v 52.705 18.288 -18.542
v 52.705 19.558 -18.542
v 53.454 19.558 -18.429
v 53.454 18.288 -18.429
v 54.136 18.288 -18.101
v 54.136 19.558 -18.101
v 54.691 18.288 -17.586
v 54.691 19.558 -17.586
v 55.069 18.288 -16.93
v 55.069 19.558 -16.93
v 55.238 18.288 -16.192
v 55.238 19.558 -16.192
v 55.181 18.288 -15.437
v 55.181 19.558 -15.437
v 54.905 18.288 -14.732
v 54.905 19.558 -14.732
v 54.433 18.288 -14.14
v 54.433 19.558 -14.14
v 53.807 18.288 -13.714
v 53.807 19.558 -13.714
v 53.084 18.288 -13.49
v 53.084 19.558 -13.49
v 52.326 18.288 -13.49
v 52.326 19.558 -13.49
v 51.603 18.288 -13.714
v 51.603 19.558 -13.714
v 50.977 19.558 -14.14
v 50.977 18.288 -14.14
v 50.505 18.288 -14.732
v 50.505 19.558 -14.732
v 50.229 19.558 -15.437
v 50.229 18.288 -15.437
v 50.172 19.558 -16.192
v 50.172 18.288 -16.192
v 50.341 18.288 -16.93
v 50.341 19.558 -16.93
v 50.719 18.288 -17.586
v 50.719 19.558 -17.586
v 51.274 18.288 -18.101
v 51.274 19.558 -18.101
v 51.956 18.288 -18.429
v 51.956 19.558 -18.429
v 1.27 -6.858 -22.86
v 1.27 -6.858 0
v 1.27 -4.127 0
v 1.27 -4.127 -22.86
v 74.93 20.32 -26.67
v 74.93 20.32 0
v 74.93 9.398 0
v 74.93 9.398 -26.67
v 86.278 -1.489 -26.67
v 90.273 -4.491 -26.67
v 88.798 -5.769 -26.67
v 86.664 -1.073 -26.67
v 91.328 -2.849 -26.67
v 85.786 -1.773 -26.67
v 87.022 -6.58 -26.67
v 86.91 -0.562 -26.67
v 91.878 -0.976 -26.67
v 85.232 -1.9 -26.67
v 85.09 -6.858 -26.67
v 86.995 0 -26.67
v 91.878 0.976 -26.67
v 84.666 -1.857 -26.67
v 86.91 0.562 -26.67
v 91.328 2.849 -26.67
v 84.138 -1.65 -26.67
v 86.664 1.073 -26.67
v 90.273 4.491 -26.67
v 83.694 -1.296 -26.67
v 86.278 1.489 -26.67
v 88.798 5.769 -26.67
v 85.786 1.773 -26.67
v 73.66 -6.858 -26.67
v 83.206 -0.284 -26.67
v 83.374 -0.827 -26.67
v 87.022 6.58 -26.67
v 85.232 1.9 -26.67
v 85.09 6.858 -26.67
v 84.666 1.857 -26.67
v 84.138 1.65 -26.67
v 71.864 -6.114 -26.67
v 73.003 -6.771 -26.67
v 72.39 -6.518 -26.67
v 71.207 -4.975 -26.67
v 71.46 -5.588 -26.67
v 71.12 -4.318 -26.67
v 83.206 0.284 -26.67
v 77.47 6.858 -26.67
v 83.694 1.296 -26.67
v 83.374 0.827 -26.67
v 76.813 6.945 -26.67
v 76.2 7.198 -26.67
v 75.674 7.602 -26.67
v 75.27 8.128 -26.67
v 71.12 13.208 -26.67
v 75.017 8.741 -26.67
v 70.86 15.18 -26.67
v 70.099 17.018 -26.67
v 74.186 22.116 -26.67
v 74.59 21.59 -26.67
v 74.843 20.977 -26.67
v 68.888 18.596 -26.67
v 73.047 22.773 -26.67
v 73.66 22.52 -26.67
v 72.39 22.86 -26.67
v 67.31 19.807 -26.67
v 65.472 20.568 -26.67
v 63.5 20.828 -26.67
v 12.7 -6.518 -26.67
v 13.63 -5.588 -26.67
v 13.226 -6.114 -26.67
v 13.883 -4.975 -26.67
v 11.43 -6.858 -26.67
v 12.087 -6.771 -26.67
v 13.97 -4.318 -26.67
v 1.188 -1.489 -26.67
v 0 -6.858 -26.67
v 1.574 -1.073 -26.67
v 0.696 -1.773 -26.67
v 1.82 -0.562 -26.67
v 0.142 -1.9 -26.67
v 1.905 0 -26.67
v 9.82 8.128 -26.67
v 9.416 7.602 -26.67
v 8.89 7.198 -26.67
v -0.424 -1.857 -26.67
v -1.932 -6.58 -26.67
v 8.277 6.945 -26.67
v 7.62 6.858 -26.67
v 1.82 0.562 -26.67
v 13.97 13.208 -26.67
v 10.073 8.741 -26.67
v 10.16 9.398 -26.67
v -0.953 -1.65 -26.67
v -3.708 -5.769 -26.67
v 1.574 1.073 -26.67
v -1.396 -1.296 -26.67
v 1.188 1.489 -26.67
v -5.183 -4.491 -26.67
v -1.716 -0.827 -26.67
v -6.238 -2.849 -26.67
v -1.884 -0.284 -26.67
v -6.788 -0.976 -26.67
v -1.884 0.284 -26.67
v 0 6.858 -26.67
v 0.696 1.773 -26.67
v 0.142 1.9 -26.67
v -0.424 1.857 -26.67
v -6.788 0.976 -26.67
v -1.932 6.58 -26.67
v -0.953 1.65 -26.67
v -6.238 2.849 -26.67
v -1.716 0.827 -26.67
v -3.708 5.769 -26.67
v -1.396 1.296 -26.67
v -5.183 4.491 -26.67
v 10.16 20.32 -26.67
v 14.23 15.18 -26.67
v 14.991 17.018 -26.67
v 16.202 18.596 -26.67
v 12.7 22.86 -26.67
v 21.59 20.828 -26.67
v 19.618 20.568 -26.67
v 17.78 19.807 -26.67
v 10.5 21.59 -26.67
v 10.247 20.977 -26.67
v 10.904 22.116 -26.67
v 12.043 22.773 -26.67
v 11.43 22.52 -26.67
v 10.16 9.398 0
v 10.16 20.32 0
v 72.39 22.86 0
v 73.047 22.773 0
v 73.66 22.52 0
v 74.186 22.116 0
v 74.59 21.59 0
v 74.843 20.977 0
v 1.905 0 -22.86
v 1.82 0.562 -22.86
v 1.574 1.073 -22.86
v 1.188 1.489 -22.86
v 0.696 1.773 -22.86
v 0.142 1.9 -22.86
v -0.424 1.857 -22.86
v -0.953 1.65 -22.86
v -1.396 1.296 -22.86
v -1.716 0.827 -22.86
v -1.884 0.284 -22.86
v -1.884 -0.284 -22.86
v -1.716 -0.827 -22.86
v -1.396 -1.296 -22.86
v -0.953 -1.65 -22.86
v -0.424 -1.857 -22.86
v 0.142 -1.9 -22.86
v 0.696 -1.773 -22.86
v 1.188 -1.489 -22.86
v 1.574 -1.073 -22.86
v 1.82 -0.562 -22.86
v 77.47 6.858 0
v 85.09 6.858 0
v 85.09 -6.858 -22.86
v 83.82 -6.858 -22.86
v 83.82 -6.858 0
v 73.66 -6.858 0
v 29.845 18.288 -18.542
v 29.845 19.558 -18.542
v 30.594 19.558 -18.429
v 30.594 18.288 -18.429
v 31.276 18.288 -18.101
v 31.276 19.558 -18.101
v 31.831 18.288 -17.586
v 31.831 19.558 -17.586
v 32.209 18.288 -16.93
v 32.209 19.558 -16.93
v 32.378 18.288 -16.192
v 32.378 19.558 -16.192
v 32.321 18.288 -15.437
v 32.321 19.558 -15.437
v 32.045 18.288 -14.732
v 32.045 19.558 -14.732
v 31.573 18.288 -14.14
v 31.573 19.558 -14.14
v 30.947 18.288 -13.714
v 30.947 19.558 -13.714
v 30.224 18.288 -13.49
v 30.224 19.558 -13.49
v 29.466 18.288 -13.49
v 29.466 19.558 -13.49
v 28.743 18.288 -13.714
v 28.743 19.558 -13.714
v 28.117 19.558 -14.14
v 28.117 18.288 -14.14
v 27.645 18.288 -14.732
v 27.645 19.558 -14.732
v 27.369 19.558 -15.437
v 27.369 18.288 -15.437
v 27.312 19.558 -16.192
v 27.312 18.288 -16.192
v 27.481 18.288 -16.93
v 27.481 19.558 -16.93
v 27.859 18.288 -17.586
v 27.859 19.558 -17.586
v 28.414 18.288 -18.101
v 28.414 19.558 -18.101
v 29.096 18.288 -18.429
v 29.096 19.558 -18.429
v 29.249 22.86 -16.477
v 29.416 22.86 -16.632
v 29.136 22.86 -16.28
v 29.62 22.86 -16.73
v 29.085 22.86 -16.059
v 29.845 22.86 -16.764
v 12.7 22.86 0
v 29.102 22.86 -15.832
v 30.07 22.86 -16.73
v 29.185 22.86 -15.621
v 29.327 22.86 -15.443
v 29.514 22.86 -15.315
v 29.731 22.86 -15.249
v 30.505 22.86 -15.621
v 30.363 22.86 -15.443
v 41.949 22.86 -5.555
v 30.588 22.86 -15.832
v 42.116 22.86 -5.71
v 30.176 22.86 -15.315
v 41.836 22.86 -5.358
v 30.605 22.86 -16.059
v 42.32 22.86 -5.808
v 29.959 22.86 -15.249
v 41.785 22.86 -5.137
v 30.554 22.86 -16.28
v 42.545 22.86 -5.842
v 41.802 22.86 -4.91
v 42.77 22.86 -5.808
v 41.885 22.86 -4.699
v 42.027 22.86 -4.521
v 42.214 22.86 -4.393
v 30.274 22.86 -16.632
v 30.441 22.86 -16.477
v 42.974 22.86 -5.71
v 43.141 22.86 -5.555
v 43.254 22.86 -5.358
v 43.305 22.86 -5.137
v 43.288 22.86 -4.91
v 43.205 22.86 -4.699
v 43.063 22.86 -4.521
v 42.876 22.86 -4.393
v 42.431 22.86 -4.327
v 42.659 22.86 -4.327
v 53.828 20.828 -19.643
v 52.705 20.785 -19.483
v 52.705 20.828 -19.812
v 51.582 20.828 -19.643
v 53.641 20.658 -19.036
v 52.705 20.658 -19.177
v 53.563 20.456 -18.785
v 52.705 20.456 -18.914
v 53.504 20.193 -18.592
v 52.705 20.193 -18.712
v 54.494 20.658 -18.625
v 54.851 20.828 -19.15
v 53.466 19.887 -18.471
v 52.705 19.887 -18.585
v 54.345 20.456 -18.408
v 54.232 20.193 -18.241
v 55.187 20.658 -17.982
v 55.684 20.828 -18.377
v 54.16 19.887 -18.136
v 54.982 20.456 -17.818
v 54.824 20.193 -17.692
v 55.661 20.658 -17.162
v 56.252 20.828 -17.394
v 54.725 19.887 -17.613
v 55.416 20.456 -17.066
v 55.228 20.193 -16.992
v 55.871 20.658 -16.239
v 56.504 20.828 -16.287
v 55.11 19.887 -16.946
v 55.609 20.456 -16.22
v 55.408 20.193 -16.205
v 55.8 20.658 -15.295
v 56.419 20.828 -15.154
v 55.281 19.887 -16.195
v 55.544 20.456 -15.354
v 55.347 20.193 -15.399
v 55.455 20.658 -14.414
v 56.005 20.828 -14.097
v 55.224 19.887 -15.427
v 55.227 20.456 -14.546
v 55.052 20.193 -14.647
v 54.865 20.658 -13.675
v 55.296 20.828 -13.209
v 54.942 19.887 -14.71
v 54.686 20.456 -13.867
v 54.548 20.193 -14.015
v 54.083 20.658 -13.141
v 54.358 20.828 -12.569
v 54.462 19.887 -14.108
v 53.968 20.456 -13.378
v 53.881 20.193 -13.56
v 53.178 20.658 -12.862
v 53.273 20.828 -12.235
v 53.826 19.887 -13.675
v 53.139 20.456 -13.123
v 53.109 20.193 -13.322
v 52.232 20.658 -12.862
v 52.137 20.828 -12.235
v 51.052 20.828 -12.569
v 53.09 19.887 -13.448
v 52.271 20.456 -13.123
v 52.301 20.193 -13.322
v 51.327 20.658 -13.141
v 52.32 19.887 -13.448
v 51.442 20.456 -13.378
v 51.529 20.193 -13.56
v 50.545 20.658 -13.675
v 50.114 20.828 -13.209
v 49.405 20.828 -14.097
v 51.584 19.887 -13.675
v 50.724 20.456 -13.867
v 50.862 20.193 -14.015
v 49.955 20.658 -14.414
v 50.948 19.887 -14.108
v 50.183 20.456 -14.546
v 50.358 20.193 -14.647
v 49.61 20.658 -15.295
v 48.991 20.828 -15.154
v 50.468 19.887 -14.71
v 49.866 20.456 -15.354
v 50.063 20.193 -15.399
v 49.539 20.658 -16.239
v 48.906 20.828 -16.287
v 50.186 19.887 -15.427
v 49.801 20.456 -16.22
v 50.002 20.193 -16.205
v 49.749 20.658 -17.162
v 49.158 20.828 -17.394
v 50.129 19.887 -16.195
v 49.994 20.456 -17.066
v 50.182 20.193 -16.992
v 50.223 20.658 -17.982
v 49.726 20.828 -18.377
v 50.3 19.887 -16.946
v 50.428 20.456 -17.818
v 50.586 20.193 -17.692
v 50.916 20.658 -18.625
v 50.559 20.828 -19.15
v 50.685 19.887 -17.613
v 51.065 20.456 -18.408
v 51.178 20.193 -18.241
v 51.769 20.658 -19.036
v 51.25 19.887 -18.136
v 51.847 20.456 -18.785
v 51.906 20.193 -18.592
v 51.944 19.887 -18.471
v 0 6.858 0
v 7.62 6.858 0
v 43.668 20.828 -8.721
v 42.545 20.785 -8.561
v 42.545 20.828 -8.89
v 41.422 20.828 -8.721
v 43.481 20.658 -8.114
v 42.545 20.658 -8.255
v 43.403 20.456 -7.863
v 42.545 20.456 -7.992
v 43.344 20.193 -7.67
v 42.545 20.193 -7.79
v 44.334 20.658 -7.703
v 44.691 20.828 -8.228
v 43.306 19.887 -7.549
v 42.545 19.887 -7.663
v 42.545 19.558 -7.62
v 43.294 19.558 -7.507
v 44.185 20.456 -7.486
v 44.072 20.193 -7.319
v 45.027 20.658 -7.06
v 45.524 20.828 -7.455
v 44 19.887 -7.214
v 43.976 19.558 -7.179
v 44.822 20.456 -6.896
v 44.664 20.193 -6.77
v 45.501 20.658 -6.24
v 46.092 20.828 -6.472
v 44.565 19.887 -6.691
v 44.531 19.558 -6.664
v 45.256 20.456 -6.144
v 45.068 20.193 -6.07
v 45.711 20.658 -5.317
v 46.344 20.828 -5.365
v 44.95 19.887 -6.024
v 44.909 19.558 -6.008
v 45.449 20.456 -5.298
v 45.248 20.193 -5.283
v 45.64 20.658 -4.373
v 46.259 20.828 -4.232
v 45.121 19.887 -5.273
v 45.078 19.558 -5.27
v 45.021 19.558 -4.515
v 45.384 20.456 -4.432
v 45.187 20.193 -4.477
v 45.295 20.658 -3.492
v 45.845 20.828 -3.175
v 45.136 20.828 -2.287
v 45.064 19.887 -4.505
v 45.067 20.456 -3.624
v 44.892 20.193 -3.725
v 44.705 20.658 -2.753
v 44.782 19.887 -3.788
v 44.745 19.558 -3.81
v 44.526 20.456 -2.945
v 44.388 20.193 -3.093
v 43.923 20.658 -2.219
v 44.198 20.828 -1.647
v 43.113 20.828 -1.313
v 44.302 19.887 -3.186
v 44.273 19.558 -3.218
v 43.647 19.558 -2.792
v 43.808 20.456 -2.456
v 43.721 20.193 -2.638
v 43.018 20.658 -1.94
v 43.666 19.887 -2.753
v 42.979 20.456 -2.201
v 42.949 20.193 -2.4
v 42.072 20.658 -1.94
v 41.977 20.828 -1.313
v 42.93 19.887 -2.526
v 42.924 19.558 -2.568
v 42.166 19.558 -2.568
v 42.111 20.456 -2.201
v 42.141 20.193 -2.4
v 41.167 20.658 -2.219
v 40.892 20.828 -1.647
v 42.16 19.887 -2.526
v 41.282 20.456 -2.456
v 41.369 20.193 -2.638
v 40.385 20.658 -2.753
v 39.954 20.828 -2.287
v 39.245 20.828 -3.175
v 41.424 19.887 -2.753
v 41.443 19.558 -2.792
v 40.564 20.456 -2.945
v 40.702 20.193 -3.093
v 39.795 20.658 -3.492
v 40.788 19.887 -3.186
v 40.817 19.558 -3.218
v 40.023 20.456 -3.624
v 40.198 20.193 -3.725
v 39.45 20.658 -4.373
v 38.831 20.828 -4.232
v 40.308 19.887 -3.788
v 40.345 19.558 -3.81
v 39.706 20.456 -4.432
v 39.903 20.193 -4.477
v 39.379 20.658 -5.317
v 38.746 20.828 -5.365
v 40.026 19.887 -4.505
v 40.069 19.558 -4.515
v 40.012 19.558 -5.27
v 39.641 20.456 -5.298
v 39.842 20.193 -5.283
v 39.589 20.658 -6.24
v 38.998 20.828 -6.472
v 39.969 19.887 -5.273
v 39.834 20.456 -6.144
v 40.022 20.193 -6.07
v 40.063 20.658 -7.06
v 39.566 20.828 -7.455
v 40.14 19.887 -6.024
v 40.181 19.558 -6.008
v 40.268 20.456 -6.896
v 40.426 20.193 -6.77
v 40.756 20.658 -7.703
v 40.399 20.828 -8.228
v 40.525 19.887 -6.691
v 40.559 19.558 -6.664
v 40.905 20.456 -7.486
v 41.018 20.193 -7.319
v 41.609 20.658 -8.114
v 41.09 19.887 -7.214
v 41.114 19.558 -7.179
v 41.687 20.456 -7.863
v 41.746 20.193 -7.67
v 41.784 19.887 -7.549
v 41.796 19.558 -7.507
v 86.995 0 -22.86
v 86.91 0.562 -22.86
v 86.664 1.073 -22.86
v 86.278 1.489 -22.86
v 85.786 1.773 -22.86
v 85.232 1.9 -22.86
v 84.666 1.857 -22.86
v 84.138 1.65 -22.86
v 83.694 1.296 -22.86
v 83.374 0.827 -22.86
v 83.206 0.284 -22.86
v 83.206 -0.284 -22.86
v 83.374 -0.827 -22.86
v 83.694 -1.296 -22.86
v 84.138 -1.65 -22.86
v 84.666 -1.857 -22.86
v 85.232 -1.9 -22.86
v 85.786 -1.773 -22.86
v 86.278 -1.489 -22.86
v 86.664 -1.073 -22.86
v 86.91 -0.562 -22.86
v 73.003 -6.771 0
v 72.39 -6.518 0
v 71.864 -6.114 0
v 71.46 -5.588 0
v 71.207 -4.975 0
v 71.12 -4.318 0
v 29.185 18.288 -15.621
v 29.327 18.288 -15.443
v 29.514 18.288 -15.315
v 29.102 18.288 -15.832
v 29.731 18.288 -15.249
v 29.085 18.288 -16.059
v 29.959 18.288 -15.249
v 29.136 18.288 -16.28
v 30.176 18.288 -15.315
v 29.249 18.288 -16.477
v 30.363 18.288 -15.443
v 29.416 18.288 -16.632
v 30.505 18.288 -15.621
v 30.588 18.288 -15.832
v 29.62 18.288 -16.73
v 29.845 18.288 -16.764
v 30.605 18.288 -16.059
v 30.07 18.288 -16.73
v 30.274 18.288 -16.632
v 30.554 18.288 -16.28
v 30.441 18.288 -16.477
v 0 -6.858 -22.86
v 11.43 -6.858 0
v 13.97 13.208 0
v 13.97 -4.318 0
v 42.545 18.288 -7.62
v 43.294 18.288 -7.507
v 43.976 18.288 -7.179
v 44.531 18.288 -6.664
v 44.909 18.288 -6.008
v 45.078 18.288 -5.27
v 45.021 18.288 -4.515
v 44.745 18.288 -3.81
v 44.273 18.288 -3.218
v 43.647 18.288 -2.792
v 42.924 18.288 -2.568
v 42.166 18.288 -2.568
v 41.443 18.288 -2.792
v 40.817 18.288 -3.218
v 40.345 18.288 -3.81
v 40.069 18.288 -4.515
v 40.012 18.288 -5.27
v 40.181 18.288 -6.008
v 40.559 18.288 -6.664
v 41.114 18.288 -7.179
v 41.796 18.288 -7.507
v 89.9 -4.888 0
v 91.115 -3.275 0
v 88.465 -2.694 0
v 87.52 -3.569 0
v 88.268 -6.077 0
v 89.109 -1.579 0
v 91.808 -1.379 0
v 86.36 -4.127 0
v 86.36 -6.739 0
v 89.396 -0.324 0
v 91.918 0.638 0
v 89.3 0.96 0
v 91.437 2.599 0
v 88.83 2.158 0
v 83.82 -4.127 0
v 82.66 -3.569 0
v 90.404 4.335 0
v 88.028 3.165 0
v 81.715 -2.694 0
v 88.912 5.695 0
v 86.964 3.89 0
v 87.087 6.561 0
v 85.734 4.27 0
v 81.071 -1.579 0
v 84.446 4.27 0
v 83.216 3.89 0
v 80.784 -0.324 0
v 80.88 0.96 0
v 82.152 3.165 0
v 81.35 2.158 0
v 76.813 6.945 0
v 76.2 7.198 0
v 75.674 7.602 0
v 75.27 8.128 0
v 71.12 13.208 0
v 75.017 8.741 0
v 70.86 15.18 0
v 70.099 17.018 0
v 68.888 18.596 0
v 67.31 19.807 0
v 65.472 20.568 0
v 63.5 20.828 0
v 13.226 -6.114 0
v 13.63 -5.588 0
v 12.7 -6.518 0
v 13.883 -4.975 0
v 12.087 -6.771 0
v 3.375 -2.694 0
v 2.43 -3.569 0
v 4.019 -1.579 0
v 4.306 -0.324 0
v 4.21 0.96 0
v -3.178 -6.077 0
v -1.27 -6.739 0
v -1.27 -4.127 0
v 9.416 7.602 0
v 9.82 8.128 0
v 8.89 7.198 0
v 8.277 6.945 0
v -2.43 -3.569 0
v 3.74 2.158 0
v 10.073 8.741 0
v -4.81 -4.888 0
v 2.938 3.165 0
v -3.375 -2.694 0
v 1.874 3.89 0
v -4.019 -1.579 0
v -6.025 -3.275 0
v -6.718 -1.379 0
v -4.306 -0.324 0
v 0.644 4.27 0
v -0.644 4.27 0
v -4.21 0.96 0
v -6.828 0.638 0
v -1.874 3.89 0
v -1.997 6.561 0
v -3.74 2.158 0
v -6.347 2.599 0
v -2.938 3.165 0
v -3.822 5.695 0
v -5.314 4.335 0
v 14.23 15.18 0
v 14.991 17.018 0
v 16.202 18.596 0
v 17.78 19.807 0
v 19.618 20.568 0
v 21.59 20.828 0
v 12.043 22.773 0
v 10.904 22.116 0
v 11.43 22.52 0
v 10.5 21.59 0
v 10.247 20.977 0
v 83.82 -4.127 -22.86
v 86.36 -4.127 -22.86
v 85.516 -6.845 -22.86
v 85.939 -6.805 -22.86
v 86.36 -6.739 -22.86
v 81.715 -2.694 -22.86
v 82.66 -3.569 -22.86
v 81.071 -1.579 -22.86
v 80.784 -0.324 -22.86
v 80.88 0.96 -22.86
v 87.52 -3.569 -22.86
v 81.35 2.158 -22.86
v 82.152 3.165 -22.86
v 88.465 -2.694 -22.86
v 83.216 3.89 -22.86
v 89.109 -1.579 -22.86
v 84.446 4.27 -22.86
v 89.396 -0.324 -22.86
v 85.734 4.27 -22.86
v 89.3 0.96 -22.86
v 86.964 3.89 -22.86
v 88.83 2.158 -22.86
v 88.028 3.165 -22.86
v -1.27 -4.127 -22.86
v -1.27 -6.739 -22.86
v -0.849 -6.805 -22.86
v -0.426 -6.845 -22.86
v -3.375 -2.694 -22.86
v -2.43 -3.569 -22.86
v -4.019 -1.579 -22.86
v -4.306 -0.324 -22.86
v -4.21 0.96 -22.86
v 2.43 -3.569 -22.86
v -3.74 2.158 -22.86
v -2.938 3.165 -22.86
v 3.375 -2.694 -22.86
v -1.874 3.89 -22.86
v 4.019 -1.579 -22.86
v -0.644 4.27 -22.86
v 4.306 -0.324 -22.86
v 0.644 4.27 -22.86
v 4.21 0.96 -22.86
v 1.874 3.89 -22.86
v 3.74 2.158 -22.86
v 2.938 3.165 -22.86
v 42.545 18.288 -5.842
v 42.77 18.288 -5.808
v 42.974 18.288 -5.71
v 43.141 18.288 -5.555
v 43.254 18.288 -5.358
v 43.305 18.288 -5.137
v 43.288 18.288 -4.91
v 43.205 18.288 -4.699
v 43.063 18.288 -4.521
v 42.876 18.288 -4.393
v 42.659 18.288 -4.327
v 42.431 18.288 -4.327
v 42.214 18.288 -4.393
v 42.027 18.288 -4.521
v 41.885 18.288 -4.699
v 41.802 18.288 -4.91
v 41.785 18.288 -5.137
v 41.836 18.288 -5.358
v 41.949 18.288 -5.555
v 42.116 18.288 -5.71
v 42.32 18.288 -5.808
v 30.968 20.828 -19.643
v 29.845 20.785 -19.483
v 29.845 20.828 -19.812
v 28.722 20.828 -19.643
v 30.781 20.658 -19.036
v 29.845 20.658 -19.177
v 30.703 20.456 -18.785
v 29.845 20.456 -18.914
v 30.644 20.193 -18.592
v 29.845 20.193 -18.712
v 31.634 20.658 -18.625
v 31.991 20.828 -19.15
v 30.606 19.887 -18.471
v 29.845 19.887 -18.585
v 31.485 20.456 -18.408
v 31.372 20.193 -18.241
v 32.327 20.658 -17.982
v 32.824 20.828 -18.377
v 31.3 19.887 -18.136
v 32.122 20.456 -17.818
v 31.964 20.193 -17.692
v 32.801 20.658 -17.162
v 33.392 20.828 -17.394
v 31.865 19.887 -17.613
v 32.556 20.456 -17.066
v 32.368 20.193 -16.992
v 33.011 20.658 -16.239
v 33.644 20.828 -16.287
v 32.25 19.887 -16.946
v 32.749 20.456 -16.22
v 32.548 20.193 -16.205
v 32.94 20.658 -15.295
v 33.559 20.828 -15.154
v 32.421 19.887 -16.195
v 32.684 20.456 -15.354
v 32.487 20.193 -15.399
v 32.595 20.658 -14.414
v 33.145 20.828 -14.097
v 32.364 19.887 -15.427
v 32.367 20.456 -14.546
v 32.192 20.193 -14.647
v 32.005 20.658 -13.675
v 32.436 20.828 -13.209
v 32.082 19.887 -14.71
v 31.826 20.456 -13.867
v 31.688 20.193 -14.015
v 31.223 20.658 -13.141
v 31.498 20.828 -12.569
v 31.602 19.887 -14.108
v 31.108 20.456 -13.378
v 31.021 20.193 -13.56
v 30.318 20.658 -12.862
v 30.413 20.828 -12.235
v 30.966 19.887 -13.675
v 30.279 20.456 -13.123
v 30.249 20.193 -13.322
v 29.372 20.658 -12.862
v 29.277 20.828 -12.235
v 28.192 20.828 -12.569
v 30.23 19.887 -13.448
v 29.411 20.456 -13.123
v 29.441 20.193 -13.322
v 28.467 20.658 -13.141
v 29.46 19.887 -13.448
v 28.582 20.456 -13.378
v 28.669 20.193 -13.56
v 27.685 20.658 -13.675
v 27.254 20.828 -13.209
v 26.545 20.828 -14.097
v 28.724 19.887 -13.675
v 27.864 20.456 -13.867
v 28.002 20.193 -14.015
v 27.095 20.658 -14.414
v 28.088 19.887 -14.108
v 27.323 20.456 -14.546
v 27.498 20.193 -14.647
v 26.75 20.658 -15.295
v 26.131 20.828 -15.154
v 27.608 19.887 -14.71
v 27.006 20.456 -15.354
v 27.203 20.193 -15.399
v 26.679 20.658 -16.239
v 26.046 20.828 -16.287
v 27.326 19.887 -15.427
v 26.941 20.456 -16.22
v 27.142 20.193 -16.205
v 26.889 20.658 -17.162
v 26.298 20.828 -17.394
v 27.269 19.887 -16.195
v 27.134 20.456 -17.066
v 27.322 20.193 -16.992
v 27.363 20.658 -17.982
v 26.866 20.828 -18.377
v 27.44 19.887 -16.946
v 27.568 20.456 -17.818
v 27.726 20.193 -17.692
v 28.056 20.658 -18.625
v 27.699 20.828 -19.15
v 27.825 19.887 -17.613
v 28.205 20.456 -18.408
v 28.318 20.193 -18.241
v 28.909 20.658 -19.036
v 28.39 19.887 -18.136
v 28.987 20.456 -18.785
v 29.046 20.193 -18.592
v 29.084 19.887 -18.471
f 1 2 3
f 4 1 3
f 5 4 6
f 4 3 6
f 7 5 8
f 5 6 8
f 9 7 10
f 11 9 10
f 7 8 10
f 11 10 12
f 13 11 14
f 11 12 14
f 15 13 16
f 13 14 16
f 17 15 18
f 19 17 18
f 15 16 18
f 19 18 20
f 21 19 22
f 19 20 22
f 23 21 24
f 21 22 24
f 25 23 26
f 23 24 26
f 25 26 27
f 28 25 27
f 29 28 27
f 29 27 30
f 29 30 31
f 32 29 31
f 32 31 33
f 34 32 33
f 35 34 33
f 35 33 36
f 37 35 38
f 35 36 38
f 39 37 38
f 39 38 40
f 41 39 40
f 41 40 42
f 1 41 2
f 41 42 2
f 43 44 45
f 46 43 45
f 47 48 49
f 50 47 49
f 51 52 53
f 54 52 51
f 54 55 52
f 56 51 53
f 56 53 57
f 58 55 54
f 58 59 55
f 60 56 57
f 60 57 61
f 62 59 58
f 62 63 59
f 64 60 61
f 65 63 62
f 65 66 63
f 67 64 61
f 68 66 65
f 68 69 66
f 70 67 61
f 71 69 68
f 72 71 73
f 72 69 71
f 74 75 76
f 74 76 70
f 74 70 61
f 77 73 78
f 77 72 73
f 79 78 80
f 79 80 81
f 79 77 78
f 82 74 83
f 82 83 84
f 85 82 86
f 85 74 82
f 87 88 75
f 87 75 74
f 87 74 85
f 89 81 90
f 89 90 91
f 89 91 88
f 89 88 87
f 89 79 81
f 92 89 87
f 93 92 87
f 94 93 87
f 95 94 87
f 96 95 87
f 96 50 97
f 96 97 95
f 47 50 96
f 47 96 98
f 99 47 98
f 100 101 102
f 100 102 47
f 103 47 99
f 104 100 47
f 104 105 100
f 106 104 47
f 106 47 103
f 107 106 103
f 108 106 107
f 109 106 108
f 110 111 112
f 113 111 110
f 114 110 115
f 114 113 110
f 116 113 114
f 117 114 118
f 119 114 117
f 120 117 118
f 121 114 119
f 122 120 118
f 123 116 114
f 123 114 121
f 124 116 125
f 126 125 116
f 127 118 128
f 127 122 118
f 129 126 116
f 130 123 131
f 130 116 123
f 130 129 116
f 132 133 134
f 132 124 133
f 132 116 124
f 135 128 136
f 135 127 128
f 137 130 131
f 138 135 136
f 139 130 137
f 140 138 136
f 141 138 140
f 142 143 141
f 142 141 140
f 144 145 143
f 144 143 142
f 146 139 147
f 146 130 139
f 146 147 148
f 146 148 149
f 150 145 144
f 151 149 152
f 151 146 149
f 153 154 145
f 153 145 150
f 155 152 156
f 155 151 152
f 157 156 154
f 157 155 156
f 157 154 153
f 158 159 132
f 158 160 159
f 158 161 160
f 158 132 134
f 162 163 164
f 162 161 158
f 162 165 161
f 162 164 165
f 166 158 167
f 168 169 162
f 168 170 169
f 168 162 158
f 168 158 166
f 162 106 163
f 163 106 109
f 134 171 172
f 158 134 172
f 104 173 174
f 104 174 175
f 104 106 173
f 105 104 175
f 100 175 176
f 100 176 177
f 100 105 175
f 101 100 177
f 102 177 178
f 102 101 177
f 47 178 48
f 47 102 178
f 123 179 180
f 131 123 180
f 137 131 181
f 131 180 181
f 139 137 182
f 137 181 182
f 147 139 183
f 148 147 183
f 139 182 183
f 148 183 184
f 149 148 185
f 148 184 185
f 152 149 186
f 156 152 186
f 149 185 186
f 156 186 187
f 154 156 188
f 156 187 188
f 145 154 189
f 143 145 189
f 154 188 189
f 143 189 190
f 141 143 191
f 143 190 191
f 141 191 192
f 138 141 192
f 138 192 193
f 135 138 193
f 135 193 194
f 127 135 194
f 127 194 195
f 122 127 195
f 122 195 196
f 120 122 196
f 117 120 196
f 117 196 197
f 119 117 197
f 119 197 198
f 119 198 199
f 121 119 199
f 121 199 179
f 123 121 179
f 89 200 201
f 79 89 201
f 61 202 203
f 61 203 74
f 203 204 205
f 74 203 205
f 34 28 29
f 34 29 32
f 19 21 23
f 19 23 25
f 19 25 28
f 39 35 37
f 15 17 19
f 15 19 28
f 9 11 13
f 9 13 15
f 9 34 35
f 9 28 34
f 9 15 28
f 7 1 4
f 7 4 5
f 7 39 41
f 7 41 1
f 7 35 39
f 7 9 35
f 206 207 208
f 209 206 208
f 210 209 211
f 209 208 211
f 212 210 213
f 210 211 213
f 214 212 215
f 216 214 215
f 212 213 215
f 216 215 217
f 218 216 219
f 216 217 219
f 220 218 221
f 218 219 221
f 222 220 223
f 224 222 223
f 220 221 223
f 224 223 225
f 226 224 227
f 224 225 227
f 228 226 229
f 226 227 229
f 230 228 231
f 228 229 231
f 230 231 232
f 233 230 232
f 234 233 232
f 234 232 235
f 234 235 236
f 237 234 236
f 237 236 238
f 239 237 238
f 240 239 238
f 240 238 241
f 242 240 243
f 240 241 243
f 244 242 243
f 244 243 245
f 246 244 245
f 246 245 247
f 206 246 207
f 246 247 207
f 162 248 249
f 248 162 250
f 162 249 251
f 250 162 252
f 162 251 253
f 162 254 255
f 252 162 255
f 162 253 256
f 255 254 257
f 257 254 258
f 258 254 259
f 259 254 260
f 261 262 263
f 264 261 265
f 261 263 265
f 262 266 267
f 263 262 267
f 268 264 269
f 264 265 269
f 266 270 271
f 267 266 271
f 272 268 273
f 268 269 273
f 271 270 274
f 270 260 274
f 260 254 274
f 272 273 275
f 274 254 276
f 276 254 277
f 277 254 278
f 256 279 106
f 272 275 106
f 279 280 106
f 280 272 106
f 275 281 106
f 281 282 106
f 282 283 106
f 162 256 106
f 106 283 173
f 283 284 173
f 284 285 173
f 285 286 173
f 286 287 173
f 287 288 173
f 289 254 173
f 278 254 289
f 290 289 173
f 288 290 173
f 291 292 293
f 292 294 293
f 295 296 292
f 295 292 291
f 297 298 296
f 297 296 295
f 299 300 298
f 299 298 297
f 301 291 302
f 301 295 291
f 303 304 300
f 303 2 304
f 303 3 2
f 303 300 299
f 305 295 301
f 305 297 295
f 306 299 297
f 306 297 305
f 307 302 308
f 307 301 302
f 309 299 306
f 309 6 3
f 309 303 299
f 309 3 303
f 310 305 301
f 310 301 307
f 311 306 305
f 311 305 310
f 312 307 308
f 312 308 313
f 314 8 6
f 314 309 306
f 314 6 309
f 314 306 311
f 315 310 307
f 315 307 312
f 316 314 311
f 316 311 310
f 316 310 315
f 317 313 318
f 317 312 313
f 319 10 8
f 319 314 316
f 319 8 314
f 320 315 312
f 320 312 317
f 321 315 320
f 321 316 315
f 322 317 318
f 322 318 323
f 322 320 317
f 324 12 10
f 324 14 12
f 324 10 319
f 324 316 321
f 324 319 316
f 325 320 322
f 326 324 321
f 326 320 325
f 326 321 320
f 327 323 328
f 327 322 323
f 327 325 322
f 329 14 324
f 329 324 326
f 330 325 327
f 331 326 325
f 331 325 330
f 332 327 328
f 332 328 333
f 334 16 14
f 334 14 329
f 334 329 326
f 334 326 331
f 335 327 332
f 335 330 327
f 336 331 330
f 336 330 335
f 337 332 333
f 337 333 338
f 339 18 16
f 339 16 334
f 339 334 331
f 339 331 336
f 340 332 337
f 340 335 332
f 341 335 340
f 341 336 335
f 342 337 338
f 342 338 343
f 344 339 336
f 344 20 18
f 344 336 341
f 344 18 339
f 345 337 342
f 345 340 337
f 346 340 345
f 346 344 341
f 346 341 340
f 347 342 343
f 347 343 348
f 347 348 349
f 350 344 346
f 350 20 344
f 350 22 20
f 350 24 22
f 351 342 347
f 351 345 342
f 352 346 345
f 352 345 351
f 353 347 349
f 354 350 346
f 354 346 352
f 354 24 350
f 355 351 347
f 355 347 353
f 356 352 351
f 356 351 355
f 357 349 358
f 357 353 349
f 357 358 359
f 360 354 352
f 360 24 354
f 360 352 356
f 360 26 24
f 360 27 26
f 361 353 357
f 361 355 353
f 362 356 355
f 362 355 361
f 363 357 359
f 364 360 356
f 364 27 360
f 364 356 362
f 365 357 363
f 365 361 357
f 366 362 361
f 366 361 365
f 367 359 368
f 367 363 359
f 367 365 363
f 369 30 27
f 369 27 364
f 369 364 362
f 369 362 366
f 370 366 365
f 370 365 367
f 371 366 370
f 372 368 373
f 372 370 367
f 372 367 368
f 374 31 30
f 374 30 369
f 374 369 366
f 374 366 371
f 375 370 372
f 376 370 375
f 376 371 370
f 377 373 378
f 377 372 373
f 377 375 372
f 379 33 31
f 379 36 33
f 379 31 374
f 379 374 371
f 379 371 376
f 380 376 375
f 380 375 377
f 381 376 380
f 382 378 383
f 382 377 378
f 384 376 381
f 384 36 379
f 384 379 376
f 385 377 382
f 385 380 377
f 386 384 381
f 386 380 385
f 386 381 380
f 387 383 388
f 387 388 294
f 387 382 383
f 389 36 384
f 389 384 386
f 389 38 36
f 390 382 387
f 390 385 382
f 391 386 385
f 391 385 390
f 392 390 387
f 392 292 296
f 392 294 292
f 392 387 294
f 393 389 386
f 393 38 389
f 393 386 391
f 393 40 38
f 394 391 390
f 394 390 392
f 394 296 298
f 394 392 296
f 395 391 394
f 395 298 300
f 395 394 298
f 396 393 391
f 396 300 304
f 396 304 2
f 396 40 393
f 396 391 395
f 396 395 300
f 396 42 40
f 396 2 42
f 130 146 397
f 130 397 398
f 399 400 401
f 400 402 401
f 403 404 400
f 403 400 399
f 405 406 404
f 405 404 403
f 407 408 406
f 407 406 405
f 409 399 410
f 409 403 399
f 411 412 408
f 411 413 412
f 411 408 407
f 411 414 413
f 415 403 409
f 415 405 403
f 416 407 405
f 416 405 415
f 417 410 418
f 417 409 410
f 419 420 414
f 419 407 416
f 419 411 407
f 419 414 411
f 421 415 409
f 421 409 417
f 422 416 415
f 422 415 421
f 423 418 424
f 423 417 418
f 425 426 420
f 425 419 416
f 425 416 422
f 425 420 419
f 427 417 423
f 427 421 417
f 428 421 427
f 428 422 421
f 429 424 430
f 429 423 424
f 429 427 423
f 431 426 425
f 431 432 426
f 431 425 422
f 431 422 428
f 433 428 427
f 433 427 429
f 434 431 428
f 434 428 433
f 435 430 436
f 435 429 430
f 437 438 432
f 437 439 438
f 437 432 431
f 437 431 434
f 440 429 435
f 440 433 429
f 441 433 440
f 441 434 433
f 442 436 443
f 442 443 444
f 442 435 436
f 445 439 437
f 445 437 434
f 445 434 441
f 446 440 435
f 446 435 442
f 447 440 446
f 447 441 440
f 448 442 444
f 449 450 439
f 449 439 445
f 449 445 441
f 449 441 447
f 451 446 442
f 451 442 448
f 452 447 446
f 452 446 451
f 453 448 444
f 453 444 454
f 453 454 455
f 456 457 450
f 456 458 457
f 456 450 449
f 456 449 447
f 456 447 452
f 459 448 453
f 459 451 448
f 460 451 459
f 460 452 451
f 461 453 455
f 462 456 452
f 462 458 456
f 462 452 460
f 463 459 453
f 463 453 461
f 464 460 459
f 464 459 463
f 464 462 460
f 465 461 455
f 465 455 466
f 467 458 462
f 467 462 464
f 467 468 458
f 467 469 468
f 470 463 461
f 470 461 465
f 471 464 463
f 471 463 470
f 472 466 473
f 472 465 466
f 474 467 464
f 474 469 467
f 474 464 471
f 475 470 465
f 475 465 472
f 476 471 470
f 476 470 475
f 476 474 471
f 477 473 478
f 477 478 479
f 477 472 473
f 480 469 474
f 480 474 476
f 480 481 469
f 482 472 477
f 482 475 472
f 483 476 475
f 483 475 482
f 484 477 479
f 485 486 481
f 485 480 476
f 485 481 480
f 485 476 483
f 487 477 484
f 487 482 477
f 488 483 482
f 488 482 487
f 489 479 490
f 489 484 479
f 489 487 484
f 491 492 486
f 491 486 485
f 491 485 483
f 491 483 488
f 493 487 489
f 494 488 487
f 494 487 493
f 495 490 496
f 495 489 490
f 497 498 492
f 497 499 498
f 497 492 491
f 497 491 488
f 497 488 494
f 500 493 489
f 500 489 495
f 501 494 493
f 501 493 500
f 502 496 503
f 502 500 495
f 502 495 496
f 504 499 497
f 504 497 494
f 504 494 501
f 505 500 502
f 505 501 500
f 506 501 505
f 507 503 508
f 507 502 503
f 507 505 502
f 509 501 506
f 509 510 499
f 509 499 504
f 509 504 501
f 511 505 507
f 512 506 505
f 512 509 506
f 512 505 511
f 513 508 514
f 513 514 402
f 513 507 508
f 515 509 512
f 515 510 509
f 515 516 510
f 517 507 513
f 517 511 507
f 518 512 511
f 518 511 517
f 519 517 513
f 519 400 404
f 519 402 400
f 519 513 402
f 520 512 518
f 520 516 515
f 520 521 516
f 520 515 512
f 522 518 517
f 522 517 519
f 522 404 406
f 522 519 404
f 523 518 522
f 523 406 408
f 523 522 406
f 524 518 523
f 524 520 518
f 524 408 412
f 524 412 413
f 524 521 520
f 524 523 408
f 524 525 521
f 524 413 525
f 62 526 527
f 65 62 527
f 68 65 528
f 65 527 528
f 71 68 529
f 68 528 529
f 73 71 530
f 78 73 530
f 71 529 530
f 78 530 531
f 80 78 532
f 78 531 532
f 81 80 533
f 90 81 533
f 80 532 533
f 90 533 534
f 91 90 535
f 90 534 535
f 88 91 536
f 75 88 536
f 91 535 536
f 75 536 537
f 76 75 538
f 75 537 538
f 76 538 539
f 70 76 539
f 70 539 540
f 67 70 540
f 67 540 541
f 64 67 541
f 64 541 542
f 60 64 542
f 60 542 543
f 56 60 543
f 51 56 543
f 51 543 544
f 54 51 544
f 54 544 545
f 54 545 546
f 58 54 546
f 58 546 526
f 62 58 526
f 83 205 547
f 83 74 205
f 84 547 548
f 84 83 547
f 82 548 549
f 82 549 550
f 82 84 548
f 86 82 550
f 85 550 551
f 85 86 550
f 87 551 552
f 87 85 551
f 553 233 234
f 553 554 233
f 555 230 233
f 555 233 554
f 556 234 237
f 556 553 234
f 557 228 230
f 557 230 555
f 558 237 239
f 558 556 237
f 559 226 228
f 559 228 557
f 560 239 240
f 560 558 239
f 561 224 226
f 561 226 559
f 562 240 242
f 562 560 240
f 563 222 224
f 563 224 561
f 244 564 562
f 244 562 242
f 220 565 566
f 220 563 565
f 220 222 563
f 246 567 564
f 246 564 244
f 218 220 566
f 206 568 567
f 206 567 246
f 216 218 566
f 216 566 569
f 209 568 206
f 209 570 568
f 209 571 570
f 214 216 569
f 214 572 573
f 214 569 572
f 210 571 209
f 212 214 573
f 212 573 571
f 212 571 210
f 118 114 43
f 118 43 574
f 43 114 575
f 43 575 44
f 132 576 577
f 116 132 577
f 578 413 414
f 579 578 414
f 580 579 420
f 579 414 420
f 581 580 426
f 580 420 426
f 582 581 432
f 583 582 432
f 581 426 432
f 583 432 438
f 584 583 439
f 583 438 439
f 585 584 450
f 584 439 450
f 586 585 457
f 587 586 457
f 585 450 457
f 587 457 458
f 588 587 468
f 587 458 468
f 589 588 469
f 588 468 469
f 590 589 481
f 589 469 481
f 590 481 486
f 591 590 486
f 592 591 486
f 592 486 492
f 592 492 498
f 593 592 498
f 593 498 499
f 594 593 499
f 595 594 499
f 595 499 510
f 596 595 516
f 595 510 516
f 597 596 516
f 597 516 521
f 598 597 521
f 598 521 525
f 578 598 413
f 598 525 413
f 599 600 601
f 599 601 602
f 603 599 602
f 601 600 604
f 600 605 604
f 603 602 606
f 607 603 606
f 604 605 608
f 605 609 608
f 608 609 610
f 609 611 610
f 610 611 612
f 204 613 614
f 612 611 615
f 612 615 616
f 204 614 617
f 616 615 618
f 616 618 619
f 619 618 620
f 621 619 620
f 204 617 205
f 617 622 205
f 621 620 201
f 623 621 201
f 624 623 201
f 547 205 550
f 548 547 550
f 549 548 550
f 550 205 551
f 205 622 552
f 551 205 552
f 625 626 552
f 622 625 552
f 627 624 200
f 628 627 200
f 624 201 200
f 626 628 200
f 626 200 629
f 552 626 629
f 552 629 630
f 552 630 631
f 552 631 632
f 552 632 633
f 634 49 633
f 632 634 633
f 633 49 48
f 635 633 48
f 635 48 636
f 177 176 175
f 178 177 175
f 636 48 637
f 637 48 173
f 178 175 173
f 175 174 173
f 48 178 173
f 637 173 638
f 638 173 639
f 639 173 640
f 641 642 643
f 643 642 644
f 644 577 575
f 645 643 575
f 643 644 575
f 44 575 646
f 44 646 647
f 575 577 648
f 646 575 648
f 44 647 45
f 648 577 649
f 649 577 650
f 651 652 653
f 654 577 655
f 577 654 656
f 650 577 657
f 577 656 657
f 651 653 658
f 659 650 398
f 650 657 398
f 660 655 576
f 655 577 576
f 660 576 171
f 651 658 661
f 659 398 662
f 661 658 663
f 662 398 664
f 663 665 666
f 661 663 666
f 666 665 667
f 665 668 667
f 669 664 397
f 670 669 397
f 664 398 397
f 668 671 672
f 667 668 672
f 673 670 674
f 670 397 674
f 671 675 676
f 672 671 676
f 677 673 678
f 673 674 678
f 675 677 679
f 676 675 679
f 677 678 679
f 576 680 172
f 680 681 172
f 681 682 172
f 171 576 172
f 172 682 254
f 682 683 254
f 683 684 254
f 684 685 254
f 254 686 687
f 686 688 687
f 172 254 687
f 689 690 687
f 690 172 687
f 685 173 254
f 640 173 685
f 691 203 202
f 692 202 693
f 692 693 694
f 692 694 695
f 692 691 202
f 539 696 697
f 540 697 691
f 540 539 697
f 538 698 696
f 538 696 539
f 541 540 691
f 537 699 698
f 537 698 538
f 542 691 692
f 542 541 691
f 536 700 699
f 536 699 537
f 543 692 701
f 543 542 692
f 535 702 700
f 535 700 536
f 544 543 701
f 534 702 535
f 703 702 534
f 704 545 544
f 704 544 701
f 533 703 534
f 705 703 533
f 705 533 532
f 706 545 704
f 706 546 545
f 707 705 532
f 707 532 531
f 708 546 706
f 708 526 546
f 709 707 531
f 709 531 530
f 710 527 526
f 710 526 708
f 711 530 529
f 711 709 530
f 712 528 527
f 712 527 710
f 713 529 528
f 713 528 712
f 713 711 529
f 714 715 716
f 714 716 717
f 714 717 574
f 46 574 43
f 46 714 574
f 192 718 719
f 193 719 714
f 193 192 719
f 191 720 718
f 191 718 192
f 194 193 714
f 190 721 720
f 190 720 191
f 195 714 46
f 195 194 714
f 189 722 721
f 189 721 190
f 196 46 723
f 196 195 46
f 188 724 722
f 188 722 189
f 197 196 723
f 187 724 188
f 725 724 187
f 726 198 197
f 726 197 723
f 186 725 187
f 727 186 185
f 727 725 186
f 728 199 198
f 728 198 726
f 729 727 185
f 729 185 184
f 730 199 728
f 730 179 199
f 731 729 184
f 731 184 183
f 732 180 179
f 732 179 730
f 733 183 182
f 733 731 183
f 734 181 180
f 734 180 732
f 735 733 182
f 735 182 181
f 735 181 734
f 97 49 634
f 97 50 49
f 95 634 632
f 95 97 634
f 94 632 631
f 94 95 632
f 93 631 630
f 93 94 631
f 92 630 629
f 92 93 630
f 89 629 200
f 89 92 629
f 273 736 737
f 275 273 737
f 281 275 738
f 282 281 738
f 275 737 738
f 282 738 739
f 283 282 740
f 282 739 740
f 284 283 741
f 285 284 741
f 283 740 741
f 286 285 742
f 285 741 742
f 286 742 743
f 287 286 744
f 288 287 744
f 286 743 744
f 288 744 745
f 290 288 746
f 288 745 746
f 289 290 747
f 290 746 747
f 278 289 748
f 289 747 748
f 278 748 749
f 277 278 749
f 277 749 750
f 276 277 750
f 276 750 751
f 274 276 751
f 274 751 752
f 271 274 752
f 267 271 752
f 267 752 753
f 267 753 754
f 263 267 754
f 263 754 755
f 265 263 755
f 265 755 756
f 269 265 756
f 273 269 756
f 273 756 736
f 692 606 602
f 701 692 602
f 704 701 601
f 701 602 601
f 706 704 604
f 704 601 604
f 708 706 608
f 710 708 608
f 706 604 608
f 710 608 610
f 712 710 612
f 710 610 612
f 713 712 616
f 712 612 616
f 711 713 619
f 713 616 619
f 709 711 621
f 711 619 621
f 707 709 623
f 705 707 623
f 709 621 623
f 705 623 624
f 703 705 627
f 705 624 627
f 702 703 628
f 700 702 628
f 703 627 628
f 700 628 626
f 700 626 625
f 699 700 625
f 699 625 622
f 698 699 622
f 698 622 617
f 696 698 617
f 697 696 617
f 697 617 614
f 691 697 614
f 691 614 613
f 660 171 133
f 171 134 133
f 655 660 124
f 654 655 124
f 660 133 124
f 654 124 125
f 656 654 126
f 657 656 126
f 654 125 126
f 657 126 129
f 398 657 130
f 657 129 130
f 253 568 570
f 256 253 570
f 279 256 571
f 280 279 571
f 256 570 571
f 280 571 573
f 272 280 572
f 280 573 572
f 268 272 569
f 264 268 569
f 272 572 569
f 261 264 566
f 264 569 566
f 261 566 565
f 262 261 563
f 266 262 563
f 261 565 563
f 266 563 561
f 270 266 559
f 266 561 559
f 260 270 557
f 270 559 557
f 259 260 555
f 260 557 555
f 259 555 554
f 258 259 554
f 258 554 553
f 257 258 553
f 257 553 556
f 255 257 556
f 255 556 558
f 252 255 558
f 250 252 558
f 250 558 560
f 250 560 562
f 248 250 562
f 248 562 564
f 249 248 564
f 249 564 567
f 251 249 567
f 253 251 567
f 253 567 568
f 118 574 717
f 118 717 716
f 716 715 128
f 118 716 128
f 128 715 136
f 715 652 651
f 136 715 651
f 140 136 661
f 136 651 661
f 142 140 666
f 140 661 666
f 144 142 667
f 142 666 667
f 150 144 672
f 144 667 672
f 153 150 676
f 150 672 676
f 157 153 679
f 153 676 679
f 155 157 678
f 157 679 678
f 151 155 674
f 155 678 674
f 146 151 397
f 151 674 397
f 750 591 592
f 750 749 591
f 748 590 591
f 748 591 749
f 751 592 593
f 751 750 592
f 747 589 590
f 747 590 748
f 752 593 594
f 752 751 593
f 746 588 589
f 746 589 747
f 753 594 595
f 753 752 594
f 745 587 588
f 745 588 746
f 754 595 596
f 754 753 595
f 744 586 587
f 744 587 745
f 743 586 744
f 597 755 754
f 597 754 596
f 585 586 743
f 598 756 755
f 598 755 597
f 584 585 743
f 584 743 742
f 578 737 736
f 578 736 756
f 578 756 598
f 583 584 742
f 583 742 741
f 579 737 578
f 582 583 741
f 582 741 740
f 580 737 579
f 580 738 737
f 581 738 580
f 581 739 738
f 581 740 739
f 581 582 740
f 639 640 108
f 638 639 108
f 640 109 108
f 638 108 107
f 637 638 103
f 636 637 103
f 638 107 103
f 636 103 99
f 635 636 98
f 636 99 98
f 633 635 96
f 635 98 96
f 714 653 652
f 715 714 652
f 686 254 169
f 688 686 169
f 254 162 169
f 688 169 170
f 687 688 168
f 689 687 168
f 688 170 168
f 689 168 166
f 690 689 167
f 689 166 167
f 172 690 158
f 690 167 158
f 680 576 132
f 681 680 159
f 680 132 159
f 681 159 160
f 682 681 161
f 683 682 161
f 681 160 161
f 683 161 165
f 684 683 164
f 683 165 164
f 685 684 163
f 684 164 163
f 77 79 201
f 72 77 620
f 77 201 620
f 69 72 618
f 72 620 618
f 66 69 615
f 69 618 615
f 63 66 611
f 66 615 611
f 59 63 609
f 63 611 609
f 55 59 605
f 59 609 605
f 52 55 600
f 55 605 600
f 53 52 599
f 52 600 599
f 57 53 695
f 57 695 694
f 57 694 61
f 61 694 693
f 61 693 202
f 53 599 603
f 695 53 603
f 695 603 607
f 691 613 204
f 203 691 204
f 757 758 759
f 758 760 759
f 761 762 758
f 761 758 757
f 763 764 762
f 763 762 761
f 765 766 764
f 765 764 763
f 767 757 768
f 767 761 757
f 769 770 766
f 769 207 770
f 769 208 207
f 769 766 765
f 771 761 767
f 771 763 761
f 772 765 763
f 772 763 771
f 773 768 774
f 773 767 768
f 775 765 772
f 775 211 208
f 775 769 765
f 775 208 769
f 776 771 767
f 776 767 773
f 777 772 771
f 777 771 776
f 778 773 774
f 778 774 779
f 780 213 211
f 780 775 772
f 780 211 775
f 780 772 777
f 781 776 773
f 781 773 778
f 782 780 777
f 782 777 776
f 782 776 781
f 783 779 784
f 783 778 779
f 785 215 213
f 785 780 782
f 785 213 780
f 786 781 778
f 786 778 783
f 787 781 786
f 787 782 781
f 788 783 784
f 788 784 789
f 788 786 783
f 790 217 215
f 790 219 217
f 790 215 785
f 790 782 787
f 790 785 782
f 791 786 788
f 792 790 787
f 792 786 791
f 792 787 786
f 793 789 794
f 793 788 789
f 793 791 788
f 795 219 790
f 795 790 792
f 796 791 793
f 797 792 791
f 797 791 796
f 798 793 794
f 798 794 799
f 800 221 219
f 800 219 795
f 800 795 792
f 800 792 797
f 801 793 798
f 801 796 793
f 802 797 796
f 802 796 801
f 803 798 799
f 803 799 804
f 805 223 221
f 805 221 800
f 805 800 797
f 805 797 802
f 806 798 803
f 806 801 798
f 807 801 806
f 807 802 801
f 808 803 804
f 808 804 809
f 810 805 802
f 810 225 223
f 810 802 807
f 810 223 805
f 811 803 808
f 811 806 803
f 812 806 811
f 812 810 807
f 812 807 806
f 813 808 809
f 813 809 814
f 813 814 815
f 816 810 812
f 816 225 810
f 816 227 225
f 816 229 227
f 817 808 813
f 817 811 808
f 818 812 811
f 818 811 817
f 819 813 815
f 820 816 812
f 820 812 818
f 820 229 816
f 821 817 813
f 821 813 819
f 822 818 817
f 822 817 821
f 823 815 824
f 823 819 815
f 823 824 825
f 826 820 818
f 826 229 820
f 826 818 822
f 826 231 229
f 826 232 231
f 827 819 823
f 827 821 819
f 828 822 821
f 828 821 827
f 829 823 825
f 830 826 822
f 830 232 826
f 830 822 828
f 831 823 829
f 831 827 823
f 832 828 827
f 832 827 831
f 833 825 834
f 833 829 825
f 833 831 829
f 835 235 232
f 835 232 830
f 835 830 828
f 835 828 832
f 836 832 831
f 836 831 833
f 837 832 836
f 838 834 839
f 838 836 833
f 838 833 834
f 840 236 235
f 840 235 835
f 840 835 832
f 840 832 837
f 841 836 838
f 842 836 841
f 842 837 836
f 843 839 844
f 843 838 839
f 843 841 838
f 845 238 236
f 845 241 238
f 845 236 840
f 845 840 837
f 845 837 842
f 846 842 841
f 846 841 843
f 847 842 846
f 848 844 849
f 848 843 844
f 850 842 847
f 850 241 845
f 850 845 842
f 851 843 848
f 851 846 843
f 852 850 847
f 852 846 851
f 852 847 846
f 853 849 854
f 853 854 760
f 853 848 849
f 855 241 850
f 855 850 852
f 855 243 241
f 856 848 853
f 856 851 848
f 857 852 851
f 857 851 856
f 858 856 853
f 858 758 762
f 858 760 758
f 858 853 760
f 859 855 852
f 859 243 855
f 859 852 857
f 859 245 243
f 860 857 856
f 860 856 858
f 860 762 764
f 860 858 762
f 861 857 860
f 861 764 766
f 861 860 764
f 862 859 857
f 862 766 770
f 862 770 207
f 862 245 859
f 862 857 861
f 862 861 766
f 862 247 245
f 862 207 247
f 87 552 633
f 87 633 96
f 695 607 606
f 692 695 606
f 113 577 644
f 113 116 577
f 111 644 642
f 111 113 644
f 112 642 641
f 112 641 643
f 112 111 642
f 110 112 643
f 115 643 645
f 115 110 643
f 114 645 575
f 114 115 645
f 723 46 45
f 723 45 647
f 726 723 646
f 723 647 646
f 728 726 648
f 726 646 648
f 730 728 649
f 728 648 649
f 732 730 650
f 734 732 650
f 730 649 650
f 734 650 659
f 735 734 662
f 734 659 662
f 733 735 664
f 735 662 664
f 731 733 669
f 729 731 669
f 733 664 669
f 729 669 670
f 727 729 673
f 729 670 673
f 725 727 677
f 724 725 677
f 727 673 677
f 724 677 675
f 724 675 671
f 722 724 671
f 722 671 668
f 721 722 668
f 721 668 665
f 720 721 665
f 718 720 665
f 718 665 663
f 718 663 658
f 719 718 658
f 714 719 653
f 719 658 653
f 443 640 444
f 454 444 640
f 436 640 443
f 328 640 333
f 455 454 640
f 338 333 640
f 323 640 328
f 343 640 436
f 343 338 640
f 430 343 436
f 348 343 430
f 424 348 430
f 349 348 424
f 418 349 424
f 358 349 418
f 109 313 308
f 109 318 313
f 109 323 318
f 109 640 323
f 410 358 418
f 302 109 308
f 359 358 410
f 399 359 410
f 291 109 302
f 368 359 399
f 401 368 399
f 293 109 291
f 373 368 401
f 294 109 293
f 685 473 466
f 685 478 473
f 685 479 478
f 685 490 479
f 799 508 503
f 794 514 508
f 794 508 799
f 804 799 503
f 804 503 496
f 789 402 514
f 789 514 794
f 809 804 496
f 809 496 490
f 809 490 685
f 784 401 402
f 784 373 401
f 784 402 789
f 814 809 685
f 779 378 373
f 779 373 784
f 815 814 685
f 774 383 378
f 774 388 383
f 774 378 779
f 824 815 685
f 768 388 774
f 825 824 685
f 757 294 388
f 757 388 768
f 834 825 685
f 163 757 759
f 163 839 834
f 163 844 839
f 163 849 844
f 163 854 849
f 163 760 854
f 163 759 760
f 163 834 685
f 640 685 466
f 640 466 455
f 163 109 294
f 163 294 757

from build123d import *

# Parameters (mm, degrees)
SKETCH1_R           = 1.905
BOSS_EXTRUDE1_DEPTH = 26.67
CUT_EXTRUDE1_DEPTH  = 22.86
SKETCH8_W           = 57.15
SKETCH8_H           = 26.67
CUT_EXTRUDE4_DEPTH  = 1.778
SKETCH6_R           = 2.54
BOSS_EXTRUDE3_DEPTH = 2.54
SKETCH7_R           = 0.762
CUT_EXTRUDE3_DEPTH  = 7.62
FILLET1_R           = 2.54
FILLET4_R           = 7.62
SKETCH9_R           = 2.54
BOSS_EXTRUDE4_DEPTH = 2.54
FILLET3_R           = 1.27


with BuildPart() as part:
    # Sketch1 → Boss-Extrude1 (new body)
    with BuildSketch(Plane.XY):
        with BuildLine():
            Line((10.16, 22.86), (74.93, 22.86))
            Line((74.93, 22.86), (74.93, 6.858))
            Line((74.93, 6.858), (85.09, 6.858))
            ThreePointArc((85.09, 6.858), (91.948, 0), (85.09, -6.858))
            Line((85.09, -6.858), (71.12, -6.858))
            Line((71.12, -6.858), (71.12, -4.572))
            Line((71.12, -4.572), (71.12, 19.05))
            Line((71.12, 19.05), (42.545, 19.05))
            Line((42.545, 19.05), (13.97, 19.05))
            Line((13.97, 19.05), (13.97, -4.572))
            Line((13.97, -4.572), (13.97, -6.858))
            Line((13.97, -6.858), (0, -6.858))
            ThreePointArc((0, -6.858), (-6.858, 0), (0, 6.858))
            Line((0, 6.858), (10.16, 6.858))
            Line((10.16, 6.858), (10.16, 22.86))
        make_face()
        Circle(SKETCH1_R, mode=Mode.SUBTRACT)
        with Locations((85.09, 0)):
            Circle(SKETCH1_R, mode=Mode.SUBTRACT)
    extrude(amount=-BOSS_EXTRUDE1_DEPTH)

    # Sketch3 → Cut-Extrude1 (cut)
    with BuildSketch(Plane.XY):
        with BuildLine():
            Line((83.82, -4.12701151), (83.82, -6.858))
            Line((83.82, -6.858), (85.09, -6.858))
            ThreePointArc((85.09, -6.858), (85.727763736, -6.828281), (86.36, -6.739381574))
            Line((86.36, -6.739381574), (86.36, -4.12701151))
            ThreePointArc((86.36, -4.12701151), (85.09, 4.318), (83.82, -4.12701151))
        make_face()
        with BuildLine():
            Line((-1.27, -4.12701151), (-1.27, -6.739381574))
            ThreePointArc((-1.27, -6.739381574), (-0.637763736, -6.828281), (0, -6.858))
            Line((0, -6.858), (1.27, -6.858))
            Line((1.27, -6.858), (1.27, -4.12701151))
            ThreePointArc((1.27, -4.12701151), (0, 4.318), (-1.27, -4.12701151))
        make_face()
    extrude(amount=-CUT_EXTRUDE1_DEPTH, mode=Mode.SUBTRACT)

    # Sketch8 → Cut-Extrude4 (cut)
    with BuildSketch(Plane(origin=(0, 19.05, 0), x_dir=(-1, 0, 0), z_dir=(0, -1, 0))):
        with Locations((-42.545, 13.335)):
            Rectangle(SKETCH8_W, SKETCH8_H)
    extrude(amount=-CUT_EXTRUDE4_DEPTH, mode=Mode.SUBTRACT)

    # Sketch6 → Boss-Extrude3 (add)
    with BuildSketch(Plane(origin=(0, 20.828, 0), x_dir=(-1, 0, 0), z_dir=(0, -1, 0))):
        with Locations(Location((-42.545, 5.08, 0), (0, 0, 90))):
            Circle(SKETCH6_R)
        with Locations(Location((-29.845, 16.002, 0), (0, 0, 90))):
            Circle(SKETCH6_R)
    extrude(amount=BOSS_EXTRUDE3_DEPTH)

    # Sketch7 → Cut-Extrude3 (cut)
    with BuildSketch(Plane(origin=(0, 18.288, 0), x_dir=(-1, 0, 0), z_dir=(0, -1, 0))):
        with Locations(Location((-42.545, 5.08, 0), (0, 0, 90))):
            Circle(SKETCH7_R)
        with Locations(Location((-29.845, 16.002, 0), (0, 0, 90))):
            Circle(SKETCH7_R)
    extrude(amount=-CUT_EXTRUDE3_DEPTH, mode=Mode.SUBTRACT)

    # Fillet1
    fillet1_edges = [part.edges().sort_by_distance(p)[0] for p in [
        (10.16, 6.858, -13.335),
        (10.16, 22.86, -13.335),
        (74.93, 22.86, -13.335),
        (74.93, 6.858, -13.335),
        (71.12, -6.858, -13.335),
        (13.97, -6.858, -13.335),
    ]]
    fillet(fillet1_edges, radius=FILLET1_R)

    # Fillet4
    fillet4_edges = [part.edges().sort_by_distance(p)[0] for p in [
        (71.12, 20.828, -13.335),
        (13.97, 20.828, -13.335),
    ]]
    fillet(fillet4_edges, radius=FILLET4_R)

    # Sketch9 → Boss-Extrude4 (add)
    with BuildSketch(Plane(origin=(0, 20.828, 0), x_dir=(-1, 0, 0), z_dir=(0, -1, 0))):
        with Locations(Location((-52.705, 16.002, 0), (0, 0, 90))):
            Circle(SKETCH9_R)
    extrude(amount=BOSS_EXTRUDE4_DEPTH)

    # Fillet3
    fillet3_edges = [part.edges().sort_by_distance(p)[0] for p in [
        (42.545, 20.828, -2.54),
        (29.845, 20.828, -13.462),
        (52.705, 20.828, -13.462),
    ]]
    fillet(fillet3_edges, radius=FILLET3_R)


solid = part.part
